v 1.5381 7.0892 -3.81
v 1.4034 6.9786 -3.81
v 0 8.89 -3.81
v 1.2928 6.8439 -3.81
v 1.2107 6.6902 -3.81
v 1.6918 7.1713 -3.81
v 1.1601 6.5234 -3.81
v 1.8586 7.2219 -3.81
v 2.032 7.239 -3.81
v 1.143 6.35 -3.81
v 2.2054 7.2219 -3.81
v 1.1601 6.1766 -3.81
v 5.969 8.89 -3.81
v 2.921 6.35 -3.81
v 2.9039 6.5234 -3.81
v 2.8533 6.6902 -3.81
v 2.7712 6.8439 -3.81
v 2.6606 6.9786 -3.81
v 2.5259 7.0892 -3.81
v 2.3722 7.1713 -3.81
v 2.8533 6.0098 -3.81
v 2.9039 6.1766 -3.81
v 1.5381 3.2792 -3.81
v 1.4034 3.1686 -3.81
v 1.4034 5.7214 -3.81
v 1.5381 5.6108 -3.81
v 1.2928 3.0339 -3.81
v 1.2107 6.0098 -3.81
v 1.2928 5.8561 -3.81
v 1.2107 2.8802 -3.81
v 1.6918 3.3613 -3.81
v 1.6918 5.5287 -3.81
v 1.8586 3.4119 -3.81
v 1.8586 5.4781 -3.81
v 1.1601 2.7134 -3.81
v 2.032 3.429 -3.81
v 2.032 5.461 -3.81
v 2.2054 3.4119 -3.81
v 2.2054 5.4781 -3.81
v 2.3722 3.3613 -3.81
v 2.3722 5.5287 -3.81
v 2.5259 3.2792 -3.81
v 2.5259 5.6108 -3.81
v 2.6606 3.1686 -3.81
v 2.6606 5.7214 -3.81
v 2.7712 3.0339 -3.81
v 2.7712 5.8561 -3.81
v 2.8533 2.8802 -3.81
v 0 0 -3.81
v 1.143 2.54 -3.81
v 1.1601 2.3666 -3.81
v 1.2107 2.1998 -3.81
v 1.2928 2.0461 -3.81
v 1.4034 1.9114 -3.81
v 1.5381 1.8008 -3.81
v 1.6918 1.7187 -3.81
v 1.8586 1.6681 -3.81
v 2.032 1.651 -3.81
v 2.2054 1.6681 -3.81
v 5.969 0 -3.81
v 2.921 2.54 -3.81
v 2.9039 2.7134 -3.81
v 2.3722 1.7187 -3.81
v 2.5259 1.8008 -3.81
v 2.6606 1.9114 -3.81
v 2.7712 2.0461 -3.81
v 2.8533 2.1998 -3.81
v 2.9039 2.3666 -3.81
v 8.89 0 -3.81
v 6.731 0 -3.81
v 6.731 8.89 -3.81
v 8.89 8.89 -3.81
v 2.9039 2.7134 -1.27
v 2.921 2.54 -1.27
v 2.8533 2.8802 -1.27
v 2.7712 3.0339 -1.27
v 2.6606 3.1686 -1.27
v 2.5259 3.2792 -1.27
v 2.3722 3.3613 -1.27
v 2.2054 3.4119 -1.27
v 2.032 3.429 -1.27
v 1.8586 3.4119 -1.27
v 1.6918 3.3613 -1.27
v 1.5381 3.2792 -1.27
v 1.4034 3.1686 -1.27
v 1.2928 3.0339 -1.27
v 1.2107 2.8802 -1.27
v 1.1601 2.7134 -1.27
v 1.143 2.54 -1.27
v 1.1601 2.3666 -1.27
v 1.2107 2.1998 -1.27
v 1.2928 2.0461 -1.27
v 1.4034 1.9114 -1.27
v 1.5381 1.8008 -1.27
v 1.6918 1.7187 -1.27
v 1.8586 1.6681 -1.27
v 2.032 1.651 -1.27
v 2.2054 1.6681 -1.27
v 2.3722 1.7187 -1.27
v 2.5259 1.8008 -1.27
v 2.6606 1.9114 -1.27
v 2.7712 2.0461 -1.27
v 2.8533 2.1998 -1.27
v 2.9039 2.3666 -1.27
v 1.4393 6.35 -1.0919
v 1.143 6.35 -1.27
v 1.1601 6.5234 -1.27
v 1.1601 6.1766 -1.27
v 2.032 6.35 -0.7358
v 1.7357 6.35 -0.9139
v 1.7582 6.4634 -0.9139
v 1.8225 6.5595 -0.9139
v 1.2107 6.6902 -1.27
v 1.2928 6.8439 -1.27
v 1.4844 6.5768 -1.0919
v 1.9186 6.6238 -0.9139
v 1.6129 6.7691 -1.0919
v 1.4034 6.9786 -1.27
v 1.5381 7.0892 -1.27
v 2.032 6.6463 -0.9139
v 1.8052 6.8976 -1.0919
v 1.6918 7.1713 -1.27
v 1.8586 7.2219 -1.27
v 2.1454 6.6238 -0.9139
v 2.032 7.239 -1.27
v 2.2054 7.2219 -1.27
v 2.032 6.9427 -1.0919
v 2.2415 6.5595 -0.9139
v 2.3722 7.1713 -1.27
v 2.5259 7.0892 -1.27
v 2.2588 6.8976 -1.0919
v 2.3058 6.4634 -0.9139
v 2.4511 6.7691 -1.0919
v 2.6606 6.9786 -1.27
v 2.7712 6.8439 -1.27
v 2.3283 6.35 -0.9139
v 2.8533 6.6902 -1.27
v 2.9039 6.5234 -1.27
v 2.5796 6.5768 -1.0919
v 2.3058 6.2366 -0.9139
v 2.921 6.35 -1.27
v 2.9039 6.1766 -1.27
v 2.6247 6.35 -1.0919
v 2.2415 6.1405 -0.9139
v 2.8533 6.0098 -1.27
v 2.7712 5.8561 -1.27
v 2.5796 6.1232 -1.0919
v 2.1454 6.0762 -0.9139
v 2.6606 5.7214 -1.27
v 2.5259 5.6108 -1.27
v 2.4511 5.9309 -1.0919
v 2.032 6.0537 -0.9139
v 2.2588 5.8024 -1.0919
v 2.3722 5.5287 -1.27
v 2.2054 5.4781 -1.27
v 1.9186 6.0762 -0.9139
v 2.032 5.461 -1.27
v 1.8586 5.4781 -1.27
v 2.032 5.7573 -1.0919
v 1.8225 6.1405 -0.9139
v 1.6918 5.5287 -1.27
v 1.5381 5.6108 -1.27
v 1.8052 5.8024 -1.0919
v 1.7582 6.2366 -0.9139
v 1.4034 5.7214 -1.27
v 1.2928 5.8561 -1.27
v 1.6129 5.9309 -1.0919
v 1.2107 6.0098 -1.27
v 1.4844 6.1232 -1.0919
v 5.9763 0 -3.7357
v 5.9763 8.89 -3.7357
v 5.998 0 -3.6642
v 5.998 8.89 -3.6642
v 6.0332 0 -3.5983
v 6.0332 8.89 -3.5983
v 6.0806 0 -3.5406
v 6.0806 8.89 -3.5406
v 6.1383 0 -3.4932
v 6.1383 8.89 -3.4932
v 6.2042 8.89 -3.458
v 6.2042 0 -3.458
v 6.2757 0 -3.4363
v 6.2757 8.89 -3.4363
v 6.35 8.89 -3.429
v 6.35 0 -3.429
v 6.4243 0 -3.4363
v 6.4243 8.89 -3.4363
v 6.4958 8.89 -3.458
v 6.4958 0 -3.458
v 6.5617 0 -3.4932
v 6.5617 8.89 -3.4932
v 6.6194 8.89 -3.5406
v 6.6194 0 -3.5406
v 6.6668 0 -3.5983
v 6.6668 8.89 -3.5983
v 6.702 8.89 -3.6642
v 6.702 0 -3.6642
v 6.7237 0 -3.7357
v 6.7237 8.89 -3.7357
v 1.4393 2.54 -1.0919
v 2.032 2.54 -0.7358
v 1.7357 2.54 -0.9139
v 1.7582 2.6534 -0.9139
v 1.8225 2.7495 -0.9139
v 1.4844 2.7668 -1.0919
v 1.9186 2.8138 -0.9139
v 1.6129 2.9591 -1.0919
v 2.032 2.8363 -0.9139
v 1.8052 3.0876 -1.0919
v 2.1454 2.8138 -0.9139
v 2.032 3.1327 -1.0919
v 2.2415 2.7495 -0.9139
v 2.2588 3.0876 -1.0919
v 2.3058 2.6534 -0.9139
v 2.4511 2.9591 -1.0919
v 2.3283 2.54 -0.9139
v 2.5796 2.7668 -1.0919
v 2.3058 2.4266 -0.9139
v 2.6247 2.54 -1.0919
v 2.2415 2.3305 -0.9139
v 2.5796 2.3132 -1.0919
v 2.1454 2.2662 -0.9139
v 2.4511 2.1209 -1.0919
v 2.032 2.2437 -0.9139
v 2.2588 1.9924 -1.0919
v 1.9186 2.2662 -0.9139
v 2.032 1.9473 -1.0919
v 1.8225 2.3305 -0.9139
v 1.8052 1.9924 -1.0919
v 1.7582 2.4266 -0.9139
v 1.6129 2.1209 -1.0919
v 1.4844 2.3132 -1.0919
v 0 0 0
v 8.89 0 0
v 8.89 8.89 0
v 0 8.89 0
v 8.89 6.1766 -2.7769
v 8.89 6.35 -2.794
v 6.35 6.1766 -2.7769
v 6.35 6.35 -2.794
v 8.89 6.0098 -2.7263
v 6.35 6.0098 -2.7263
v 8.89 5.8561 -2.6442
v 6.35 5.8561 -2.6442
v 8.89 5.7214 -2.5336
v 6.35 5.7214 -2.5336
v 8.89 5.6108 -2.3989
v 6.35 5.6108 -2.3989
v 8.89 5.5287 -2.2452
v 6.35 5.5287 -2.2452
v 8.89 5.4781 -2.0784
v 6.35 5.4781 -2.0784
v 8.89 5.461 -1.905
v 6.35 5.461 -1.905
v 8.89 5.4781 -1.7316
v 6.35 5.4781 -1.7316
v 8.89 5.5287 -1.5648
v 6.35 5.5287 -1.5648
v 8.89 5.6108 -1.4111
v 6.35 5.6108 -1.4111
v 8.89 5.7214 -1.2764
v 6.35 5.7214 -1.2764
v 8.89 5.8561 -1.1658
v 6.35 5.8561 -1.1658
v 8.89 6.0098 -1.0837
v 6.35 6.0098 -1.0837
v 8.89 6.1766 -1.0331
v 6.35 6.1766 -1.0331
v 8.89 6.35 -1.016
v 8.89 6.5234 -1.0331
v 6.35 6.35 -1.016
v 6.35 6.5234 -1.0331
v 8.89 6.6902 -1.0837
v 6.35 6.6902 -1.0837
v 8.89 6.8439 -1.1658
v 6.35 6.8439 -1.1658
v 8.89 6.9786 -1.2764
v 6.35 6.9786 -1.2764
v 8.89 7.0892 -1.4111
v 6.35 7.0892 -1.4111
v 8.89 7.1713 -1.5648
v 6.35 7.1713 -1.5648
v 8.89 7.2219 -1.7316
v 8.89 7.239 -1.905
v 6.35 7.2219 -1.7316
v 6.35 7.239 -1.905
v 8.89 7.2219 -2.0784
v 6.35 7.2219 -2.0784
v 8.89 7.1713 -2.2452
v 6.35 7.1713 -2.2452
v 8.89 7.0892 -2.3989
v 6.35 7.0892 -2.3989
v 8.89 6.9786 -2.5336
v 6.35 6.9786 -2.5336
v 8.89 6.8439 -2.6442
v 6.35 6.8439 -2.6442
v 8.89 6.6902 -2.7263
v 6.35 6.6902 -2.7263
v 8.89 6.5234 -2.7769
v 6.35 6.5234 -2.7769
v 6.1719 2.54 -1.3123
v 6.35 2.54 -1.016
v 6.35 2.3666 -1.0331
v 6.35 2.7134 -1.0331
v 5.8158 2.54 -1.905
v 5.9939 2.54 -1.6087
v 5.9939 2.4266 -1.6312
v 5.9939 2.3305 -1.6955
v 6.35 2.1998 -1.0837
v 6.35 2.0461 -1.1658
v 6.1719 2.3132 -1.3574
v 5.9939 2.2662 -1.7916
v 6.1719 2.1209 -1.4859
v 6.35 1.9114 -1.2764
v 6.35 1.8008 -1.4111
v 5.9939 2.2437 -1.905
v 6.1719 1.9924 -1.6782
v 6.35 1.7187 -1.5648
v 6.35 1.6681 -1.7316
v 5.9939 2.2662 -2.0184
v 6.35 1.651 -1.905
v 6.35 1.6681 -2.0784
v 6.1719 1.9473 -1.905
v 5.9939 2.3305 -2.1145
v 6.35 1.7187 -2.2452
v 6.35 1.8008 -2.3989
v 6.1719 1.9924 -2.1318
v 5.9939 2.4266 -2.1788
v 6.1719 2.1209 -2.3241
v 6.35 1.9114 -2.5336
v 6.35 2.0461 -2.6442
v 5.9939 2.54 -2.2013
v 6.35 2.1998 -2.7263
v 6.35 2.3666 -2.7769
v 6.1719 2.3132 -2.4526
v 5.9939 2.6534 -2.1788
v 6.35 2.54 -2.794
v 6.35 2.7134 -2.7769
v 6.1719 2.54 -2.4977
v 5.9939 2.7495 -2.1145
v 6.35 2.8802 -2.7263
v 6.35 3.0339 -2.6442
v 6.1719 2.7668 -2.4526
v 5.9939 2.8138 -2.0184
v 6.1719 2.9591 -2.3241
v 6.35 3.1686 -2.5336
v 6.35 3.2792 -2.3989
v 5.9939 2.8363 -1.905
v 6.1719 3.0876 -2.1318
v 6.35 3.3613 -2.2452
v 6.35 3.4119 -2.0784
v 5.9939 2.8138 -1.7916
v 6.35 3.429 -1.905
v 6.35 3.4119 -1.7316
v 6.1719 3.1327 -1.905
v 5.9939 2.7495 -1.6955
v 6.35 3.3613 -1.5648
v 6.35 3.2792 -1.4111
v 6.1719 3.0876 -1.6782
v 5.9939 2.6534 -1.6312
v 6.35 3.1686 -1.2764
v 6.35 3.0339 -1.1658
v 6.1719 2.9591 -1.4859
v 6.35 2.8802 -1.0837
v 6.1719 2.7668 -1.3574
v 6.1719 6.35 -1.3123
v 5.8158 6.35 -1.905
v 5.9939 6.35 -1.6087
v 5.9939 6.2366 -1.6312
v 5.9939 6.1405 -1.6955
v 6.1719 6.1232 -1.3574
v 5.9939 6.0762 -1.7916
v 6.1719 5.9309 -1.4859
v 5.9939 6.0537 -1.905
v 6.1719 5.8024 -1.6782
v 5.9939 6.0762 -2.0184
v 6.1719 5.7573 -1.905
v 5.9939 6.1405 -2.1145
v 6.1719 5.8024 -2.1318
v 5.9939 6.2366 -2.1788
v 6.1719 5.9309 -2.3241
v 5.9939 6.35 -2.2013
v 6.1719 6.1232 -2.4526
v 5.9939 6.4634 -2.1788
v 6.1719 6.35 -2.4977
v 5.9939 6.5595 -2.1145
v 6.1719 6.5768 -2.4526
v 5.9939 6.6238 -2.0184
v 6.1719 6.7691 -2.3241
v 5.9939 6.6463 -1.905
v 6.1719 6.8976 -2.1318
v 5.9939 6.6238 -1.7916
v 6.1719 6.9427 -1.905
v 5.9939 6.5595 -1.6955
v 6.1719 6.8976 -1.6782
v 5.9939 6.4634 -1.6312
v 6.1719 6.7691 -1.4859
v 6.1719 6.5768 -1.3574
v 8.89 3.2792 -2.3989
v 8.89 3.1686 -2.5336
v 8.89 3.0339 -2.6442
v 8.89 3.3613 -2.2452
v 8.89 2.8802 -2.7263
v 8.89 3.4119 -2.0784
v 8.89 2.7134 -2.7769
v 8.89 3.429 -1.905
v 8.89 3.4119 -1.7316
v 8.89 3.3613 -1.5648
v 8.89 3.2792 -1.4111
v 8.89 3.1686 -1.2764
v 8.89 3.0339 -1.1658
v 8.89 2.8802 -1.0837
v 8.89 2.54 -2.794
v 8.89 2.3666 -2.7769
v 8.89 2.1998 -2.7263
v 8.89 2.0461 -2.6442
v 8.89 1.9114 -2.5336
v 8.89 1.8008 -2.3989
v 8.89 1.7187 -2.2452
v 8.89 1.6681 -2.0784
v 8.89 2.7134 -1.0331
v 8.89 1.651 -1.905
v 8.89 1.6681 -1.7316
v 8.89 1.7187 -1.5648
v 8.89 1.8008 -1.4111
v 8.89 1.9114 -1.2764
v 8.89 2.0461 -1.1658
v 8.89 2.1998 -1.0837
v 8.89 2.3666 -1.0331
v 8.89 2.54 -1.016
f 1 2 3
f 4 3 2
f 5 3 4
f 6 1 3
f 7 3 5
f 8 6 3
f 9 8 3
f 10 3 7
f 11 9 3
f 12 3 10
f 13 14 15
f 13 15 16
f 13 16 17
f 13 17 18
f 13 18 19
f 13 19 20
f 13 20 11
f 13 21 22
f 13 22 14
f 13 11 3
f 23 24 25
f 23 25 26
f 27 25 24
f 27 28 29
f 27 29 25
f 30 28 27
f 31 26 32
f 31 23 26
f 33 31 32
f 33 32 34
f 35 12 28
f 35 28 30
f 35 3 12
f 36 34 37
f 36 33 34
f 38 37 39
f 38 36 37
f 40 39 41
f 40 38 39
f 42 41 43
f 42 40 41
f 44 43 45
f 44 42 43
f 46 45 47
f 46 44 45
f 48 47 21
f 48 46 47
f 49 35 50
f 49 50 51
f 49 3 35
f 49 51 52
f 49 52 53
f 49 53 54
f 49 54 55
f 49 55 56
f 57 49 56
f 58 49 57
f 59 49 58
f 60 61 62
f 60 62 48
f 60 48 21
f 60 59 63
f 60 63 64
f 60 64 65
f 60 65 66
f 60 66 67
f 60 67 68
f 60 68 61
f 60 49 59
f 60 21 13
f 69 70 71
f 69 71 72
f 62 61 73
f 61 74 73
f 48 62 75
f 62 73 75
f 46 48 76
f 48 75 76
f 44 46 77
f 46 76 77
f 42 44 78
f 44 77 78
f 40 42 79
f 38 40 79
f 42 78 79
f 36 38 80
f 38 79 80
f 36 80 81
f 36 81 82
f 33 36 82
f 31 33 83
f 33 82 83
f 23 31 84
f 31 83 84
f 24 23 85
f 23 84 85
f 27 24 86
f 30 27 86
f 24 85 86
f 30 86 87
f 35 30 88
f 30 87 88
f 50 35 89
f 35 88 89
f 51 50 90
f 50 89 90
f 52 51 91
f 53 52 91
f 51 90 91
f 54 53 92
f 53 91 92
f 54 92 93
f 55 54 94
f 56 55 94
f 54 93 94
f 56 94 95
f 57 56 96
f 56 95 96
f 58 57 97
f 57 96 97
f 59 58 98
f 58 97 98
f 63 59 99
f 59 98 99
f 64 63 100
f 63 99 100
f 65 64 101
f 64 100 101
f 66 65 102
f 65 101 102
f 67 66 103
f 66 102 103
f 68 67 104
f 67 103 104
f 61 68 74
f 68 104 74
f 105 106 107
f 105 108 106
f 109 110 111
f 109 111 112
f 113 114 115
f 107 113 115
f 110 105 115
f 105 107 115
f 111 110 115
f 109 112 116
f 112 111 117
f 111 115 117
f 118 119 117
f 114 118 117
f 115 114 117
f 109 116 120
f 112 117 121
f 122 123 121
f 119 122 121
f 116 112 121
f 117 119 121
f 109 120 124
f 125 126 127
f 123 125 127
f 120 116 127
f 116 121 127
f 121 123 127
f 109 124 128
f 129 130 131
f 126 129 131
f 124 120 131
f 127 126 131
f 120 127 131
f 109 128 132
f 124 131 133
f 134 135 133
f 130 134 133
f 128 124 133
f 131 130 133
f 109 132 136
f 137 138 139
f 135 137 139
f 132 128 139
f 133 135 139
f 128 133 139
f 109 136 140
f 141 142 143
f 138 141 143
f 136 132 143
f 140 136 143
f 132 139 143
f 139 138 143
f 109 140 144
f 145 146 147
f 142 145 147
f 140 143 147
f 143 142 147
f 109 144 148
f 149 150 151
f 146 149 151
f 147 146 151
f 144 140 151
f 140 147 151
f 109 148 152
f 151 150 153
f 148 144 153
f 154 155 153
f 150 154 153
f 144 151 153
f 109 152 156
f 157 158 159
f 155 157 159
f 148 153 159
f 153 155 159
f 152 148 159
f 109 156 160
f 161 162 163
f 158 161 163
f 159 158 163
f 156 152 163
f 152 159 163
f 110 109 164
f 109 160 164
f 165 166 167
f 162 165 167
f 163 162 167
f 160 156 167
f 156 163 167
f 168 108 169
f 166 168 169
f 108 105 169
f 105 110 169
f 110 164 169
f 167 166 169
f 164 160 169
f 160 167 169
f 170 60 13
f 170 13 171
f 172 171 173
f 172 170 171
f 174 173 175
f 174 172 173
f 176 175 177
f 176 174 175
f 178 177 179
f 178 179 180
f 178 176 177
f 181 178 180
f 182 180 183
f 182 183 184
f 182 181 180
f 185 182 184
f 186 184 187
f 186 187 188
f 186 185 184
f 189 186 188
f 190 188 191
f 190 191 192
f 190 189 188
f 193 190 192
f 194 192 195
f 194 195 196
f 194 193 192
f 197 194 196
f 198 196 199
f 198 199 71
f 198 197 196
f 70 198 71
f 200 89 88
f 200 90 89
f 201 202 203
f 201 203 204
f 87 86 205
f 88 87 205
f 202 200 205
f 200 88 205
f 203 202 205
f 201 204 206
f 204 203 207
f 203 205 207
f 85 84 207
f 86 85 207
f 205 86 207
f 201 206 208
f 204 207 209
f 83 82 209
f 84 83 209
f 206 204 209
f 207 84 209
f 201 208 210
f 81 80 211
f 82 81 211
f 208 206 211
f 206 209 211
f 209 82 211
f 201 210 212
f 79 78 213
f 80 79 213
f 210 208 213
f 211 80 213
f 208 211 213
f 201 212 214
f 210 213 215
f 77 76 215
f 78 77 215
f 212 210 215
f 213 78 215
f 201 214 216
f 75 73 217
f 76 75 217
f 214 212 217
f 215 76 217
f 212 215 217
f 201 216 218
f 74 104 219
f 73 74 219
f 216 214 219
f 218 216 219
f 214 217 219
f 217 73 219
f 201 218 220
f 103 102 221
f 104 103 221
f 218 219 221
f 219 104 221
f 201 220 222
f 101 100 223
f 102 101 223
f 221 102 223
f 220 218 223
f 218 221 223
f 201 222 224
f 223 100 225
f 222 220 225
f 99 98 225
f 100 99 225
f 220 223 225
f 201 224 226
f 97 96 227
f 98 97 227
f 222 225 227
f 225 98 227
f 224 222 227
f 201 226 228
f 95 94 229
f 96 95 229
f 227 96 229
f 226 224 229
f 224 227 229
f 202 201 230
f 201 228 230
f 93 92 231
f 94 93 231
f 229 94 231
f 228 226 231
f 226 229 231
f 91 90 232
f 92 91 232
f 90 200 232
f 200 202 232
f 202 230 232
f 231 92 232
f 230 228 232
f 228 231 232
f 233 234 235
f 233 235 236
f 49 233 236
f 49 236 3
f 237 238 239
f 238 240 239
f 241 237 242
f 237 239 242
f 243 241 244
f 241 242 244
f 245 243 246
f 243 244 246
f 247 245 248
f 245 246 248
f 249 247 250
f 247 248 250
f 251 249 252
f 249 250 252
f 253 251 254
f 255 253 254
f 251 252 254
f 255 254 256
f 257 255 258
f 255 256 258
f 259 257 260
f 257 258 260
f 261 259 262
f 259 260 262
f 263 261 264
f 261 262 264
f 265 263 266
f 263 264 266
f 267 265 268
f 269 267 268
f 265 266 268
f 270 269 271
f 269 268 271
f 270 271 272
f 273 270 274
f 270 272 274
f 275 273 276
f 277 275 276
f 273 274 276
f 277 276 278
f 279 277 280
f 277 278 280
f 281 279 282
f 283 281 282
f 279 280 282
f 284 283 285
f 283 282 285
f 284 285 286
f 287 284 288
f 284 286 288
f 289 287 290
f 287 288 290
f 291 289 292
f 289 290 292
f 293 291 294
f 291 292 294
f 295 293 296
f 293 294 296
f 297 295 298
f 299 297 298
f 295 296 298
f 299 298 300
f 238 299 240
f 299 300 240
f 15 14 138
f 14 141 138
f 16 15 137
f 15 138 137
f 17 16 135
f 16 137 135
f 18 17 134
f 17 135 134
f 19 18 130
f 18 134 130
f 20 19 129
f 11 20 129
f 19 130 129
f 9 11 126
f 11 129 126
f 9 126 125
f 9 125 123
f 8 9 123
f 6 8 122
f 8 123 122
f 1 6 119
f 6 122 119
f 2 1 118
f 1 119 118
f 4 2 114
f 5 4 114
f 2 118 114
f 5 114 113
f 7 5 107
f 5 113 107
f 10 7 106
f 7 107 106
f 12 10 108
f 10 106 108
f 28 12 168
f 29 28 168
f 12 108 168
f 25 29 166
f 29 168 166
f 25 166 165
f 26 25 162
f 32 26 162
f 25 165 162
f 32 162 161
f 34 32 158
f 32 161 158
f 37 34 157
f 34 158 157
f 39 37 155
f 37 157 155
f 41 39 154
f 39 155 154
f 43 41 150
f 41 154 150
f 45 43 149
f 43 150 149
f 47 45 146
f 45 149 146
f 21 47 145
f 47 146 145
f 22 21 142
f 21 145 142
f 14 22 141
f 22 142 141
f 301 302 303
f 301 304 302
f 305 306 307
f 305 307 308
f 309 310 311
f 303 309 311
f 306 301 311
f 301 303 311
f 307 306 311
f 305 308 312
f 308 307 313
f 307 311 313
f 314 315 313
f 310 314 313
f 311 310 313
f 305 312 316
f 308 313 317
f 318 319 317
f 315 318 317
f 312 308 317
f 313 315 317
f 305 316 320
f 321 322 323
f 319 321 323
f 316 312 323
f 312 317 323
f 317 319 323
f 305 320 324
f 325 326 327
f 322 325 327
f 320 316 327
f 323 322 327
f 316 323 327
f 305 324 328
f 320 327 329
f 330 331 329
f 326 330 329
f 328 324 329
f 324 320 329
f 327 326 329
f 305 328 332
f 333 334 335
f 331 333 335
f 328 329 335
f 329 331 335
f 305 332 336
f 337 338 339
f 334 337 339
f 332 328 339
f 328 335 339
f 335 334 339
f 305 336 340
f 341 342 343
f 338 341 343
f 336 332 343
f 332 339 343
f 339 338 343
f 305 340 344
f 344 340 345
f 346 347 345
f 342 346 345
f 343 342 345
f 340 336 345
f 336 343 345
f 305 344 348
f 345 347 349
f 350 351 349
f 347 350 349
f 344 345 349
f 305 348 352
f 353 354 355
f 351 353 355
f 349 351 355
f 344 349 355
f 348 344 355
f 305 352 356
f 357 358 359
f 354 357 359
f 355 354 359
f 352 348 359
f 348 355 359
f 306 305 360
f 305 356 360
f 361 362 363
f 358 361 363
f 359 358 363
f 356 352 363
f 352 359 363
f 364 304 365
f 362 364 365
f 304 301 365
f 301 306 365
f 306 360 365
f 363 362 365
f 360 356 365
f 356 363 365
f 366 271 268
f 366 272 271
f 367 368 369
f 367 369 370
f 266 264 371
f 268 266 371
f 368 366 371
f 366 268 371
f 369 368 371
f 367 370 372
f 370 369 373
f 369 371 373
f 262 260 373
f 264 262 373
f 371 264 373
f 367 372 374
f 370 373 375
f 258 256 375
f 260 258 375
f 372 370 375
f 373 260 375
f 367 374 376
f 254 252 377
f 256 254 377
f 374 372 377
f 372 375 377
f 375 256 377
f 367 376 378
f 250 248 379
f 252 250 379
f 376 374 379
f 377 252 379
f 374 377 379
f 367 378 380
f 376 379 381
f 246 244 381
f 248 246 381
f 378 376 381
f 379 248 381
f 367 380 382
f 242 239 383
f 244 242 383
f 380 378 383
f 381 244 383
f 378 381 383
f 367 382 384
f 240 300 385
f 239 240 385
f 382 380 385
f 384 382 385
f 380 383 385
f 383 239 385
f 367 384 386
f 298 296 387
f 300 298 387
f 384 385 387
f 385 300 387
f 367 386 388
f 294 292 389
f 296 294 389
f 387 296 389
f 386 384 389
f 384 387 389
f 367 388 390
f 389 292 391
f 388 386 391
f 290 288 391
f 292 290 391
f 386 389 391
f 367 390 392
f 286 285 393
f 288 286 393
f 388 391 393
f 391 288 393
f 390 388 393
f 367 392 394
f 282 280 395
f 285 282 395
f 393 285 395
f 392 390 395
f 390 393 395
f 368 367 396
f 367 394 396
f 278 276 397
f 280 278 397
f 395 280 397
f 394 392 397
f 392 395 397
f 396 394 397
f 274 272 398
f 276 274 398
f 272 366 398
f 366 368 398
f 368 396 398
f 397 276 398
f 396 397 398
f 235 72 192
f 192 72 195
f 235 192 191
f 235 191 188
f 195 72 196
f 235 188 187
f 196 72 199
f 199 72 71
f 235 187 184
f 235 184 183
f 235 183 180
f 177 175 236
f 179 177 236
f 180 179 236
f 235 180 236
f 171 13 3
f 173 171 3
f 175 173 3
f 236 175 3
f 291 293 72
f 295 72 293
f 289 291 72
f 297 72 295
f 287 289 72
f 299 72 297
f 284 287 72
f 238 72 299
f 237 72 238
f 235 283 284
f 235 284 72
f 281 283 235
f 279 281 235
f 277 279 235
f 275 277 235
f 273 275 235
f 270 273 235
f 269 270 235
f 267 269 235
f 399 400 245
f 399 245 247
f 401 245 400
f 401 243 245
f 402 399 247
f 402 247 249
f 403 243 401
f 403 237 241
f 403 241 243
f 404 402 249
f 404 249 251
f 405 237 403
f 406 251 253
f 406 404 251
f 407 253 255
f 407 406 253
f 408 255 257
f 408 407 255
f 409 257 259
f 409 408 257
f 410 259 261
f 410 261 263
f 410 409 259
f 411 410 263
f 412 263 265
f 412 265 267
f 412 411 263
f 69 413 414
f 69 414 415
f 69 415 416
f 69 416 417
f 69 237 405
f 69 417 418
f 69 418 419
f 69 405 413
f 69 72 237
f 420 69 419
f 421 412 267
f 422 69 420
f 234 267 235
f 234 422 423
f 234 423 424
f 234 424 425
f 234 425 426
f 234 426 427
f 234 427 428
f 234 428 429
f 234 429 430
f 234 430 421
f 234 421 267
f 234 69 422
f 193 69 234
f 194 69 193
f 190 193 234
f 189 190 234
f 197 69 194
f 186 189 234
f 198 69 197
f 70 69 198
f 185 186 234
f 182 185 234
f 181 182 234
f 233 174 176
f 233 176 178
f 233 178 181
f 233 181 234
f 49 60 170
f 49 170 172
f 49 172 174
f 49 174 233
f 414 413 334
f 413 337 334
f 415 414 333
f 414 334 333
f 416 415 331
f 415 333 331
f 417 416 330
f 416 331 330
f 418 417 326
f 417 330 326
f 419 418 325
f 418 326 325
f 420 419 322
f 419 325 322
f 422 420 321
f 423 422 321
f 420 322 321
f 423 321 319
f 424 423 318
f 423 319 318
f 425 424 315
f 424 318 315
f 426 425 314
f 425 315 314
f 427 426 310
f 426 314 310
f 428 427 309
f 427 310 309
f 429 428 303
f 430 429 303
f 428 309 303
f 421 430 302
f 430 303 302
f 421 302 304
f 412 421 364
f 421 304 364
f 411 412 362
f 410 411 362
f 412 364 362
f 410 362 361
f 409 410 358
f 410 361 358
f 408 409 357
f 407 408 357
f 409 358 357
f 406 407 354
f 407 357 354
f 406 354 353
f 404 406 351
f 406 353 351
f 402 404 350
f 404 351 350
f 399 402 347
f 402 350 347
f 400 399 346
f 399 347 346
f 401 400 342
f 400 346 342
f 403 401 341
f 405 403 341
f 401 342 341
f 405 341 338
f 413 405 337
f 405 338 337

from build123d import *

# Parameters (mm, degrees)
BOSS_EXTRUDE1_DEPTH                 = 8.89
F_2_56_TAPPED_HOLE1_D               = 1.778
F_2_56_TAPPED_HOLE1_DEPTH           = 2.54
F_2_56_TAPPED_HOLE1_TIP             = 0.53416509
F_2_56_TAPPED_HOLE1_ON_FACE_2_D     = 1.778
F_2_56_TAPPED_HOLE1_ON_FACE_2_DEPTH = 2.54
F_2_56_TAPPED_HOLE1_ON_FACE_2_TIP   = 0.53416509


with BuildPart() as part:
    # Sketch1 → Boss-Extrude1 (new body)
    with BuildSketch(Plane(origin=(0, 0, 0), x_dir=(1, 0, 0), z_dir=(0, 1, 0))):
        with BuildLine():
            Line((6.731, 3.81), (8.89, 3.81))
            Line((8.89, 3.81), (8.89, 0))
            Line((8.89, 0), (0, 0))
            Line((0, 0), (0, 3.81))
            Line((0, 3.81), (5.969, 3.81))
            ThreePointArc((5.969, 3.81), (6.35, 3.429), (6.731, 3.81))
        make_face()
    extrude(amount=BOSS_EXTRUDE1_DEPTH)

    # #2-56 Tapped Hole1
    with Locations(Plane(origin=(8.89, 2.54, -1.905), x_dir=(0, 0, 1), z_dir=(1, 0, 0))):
        with Locations((0, 0), (0, -3.81)):
            Hole(F_2_56_TAPPED_HOLE1_D / 2, depth=F_2_56_TAPPED_HOLE1_DEPTH)
            with Locations((0, 0, -(F_2_56_TAPPED_HOLE1_DEPTH + F_2_56_TAPPED_HOLE1_TIP / 2))):  # 118° drill point
                Cone(0, F_2_56_TAPPED_HOLE1_D / 2, F_2_56_TAPPED_HOLE1_TIP, mode=Mode.SUBTRACT)

    # #2-56 Tapped Hole1 on face 2
    with Locations(Plane(origin=(2.032, 2.54, -3.81), x_dir=(-1, 0, 0), z_dir=(0, 0, -1))):
        with Locations((0, 0), (0, 3.81)):
            Hole(F_2_56_TAPPED_HOLE1_ON_FACE_2_D / 2, depth=F_2_56_TAPPED_HOLE1_ON_FACE_2_DEPTH)
            with Locations((0, 0, -(F_2_56_TAPPED_HOLE1_ON_FACE_2_DEPTH + F_2_56_TAPPED_HOLE1_ON_FACE_2_TIP / 2))):  # 118° drill point
                Cone(0, F_2_56_TAPPED_HOLE1_ON_FACE_2_D / 2, F_2_56_TAPPED_HOLE1_ON_FACE_2_TIP, mode=Mode.SUBTRACT)


solid = part.part
